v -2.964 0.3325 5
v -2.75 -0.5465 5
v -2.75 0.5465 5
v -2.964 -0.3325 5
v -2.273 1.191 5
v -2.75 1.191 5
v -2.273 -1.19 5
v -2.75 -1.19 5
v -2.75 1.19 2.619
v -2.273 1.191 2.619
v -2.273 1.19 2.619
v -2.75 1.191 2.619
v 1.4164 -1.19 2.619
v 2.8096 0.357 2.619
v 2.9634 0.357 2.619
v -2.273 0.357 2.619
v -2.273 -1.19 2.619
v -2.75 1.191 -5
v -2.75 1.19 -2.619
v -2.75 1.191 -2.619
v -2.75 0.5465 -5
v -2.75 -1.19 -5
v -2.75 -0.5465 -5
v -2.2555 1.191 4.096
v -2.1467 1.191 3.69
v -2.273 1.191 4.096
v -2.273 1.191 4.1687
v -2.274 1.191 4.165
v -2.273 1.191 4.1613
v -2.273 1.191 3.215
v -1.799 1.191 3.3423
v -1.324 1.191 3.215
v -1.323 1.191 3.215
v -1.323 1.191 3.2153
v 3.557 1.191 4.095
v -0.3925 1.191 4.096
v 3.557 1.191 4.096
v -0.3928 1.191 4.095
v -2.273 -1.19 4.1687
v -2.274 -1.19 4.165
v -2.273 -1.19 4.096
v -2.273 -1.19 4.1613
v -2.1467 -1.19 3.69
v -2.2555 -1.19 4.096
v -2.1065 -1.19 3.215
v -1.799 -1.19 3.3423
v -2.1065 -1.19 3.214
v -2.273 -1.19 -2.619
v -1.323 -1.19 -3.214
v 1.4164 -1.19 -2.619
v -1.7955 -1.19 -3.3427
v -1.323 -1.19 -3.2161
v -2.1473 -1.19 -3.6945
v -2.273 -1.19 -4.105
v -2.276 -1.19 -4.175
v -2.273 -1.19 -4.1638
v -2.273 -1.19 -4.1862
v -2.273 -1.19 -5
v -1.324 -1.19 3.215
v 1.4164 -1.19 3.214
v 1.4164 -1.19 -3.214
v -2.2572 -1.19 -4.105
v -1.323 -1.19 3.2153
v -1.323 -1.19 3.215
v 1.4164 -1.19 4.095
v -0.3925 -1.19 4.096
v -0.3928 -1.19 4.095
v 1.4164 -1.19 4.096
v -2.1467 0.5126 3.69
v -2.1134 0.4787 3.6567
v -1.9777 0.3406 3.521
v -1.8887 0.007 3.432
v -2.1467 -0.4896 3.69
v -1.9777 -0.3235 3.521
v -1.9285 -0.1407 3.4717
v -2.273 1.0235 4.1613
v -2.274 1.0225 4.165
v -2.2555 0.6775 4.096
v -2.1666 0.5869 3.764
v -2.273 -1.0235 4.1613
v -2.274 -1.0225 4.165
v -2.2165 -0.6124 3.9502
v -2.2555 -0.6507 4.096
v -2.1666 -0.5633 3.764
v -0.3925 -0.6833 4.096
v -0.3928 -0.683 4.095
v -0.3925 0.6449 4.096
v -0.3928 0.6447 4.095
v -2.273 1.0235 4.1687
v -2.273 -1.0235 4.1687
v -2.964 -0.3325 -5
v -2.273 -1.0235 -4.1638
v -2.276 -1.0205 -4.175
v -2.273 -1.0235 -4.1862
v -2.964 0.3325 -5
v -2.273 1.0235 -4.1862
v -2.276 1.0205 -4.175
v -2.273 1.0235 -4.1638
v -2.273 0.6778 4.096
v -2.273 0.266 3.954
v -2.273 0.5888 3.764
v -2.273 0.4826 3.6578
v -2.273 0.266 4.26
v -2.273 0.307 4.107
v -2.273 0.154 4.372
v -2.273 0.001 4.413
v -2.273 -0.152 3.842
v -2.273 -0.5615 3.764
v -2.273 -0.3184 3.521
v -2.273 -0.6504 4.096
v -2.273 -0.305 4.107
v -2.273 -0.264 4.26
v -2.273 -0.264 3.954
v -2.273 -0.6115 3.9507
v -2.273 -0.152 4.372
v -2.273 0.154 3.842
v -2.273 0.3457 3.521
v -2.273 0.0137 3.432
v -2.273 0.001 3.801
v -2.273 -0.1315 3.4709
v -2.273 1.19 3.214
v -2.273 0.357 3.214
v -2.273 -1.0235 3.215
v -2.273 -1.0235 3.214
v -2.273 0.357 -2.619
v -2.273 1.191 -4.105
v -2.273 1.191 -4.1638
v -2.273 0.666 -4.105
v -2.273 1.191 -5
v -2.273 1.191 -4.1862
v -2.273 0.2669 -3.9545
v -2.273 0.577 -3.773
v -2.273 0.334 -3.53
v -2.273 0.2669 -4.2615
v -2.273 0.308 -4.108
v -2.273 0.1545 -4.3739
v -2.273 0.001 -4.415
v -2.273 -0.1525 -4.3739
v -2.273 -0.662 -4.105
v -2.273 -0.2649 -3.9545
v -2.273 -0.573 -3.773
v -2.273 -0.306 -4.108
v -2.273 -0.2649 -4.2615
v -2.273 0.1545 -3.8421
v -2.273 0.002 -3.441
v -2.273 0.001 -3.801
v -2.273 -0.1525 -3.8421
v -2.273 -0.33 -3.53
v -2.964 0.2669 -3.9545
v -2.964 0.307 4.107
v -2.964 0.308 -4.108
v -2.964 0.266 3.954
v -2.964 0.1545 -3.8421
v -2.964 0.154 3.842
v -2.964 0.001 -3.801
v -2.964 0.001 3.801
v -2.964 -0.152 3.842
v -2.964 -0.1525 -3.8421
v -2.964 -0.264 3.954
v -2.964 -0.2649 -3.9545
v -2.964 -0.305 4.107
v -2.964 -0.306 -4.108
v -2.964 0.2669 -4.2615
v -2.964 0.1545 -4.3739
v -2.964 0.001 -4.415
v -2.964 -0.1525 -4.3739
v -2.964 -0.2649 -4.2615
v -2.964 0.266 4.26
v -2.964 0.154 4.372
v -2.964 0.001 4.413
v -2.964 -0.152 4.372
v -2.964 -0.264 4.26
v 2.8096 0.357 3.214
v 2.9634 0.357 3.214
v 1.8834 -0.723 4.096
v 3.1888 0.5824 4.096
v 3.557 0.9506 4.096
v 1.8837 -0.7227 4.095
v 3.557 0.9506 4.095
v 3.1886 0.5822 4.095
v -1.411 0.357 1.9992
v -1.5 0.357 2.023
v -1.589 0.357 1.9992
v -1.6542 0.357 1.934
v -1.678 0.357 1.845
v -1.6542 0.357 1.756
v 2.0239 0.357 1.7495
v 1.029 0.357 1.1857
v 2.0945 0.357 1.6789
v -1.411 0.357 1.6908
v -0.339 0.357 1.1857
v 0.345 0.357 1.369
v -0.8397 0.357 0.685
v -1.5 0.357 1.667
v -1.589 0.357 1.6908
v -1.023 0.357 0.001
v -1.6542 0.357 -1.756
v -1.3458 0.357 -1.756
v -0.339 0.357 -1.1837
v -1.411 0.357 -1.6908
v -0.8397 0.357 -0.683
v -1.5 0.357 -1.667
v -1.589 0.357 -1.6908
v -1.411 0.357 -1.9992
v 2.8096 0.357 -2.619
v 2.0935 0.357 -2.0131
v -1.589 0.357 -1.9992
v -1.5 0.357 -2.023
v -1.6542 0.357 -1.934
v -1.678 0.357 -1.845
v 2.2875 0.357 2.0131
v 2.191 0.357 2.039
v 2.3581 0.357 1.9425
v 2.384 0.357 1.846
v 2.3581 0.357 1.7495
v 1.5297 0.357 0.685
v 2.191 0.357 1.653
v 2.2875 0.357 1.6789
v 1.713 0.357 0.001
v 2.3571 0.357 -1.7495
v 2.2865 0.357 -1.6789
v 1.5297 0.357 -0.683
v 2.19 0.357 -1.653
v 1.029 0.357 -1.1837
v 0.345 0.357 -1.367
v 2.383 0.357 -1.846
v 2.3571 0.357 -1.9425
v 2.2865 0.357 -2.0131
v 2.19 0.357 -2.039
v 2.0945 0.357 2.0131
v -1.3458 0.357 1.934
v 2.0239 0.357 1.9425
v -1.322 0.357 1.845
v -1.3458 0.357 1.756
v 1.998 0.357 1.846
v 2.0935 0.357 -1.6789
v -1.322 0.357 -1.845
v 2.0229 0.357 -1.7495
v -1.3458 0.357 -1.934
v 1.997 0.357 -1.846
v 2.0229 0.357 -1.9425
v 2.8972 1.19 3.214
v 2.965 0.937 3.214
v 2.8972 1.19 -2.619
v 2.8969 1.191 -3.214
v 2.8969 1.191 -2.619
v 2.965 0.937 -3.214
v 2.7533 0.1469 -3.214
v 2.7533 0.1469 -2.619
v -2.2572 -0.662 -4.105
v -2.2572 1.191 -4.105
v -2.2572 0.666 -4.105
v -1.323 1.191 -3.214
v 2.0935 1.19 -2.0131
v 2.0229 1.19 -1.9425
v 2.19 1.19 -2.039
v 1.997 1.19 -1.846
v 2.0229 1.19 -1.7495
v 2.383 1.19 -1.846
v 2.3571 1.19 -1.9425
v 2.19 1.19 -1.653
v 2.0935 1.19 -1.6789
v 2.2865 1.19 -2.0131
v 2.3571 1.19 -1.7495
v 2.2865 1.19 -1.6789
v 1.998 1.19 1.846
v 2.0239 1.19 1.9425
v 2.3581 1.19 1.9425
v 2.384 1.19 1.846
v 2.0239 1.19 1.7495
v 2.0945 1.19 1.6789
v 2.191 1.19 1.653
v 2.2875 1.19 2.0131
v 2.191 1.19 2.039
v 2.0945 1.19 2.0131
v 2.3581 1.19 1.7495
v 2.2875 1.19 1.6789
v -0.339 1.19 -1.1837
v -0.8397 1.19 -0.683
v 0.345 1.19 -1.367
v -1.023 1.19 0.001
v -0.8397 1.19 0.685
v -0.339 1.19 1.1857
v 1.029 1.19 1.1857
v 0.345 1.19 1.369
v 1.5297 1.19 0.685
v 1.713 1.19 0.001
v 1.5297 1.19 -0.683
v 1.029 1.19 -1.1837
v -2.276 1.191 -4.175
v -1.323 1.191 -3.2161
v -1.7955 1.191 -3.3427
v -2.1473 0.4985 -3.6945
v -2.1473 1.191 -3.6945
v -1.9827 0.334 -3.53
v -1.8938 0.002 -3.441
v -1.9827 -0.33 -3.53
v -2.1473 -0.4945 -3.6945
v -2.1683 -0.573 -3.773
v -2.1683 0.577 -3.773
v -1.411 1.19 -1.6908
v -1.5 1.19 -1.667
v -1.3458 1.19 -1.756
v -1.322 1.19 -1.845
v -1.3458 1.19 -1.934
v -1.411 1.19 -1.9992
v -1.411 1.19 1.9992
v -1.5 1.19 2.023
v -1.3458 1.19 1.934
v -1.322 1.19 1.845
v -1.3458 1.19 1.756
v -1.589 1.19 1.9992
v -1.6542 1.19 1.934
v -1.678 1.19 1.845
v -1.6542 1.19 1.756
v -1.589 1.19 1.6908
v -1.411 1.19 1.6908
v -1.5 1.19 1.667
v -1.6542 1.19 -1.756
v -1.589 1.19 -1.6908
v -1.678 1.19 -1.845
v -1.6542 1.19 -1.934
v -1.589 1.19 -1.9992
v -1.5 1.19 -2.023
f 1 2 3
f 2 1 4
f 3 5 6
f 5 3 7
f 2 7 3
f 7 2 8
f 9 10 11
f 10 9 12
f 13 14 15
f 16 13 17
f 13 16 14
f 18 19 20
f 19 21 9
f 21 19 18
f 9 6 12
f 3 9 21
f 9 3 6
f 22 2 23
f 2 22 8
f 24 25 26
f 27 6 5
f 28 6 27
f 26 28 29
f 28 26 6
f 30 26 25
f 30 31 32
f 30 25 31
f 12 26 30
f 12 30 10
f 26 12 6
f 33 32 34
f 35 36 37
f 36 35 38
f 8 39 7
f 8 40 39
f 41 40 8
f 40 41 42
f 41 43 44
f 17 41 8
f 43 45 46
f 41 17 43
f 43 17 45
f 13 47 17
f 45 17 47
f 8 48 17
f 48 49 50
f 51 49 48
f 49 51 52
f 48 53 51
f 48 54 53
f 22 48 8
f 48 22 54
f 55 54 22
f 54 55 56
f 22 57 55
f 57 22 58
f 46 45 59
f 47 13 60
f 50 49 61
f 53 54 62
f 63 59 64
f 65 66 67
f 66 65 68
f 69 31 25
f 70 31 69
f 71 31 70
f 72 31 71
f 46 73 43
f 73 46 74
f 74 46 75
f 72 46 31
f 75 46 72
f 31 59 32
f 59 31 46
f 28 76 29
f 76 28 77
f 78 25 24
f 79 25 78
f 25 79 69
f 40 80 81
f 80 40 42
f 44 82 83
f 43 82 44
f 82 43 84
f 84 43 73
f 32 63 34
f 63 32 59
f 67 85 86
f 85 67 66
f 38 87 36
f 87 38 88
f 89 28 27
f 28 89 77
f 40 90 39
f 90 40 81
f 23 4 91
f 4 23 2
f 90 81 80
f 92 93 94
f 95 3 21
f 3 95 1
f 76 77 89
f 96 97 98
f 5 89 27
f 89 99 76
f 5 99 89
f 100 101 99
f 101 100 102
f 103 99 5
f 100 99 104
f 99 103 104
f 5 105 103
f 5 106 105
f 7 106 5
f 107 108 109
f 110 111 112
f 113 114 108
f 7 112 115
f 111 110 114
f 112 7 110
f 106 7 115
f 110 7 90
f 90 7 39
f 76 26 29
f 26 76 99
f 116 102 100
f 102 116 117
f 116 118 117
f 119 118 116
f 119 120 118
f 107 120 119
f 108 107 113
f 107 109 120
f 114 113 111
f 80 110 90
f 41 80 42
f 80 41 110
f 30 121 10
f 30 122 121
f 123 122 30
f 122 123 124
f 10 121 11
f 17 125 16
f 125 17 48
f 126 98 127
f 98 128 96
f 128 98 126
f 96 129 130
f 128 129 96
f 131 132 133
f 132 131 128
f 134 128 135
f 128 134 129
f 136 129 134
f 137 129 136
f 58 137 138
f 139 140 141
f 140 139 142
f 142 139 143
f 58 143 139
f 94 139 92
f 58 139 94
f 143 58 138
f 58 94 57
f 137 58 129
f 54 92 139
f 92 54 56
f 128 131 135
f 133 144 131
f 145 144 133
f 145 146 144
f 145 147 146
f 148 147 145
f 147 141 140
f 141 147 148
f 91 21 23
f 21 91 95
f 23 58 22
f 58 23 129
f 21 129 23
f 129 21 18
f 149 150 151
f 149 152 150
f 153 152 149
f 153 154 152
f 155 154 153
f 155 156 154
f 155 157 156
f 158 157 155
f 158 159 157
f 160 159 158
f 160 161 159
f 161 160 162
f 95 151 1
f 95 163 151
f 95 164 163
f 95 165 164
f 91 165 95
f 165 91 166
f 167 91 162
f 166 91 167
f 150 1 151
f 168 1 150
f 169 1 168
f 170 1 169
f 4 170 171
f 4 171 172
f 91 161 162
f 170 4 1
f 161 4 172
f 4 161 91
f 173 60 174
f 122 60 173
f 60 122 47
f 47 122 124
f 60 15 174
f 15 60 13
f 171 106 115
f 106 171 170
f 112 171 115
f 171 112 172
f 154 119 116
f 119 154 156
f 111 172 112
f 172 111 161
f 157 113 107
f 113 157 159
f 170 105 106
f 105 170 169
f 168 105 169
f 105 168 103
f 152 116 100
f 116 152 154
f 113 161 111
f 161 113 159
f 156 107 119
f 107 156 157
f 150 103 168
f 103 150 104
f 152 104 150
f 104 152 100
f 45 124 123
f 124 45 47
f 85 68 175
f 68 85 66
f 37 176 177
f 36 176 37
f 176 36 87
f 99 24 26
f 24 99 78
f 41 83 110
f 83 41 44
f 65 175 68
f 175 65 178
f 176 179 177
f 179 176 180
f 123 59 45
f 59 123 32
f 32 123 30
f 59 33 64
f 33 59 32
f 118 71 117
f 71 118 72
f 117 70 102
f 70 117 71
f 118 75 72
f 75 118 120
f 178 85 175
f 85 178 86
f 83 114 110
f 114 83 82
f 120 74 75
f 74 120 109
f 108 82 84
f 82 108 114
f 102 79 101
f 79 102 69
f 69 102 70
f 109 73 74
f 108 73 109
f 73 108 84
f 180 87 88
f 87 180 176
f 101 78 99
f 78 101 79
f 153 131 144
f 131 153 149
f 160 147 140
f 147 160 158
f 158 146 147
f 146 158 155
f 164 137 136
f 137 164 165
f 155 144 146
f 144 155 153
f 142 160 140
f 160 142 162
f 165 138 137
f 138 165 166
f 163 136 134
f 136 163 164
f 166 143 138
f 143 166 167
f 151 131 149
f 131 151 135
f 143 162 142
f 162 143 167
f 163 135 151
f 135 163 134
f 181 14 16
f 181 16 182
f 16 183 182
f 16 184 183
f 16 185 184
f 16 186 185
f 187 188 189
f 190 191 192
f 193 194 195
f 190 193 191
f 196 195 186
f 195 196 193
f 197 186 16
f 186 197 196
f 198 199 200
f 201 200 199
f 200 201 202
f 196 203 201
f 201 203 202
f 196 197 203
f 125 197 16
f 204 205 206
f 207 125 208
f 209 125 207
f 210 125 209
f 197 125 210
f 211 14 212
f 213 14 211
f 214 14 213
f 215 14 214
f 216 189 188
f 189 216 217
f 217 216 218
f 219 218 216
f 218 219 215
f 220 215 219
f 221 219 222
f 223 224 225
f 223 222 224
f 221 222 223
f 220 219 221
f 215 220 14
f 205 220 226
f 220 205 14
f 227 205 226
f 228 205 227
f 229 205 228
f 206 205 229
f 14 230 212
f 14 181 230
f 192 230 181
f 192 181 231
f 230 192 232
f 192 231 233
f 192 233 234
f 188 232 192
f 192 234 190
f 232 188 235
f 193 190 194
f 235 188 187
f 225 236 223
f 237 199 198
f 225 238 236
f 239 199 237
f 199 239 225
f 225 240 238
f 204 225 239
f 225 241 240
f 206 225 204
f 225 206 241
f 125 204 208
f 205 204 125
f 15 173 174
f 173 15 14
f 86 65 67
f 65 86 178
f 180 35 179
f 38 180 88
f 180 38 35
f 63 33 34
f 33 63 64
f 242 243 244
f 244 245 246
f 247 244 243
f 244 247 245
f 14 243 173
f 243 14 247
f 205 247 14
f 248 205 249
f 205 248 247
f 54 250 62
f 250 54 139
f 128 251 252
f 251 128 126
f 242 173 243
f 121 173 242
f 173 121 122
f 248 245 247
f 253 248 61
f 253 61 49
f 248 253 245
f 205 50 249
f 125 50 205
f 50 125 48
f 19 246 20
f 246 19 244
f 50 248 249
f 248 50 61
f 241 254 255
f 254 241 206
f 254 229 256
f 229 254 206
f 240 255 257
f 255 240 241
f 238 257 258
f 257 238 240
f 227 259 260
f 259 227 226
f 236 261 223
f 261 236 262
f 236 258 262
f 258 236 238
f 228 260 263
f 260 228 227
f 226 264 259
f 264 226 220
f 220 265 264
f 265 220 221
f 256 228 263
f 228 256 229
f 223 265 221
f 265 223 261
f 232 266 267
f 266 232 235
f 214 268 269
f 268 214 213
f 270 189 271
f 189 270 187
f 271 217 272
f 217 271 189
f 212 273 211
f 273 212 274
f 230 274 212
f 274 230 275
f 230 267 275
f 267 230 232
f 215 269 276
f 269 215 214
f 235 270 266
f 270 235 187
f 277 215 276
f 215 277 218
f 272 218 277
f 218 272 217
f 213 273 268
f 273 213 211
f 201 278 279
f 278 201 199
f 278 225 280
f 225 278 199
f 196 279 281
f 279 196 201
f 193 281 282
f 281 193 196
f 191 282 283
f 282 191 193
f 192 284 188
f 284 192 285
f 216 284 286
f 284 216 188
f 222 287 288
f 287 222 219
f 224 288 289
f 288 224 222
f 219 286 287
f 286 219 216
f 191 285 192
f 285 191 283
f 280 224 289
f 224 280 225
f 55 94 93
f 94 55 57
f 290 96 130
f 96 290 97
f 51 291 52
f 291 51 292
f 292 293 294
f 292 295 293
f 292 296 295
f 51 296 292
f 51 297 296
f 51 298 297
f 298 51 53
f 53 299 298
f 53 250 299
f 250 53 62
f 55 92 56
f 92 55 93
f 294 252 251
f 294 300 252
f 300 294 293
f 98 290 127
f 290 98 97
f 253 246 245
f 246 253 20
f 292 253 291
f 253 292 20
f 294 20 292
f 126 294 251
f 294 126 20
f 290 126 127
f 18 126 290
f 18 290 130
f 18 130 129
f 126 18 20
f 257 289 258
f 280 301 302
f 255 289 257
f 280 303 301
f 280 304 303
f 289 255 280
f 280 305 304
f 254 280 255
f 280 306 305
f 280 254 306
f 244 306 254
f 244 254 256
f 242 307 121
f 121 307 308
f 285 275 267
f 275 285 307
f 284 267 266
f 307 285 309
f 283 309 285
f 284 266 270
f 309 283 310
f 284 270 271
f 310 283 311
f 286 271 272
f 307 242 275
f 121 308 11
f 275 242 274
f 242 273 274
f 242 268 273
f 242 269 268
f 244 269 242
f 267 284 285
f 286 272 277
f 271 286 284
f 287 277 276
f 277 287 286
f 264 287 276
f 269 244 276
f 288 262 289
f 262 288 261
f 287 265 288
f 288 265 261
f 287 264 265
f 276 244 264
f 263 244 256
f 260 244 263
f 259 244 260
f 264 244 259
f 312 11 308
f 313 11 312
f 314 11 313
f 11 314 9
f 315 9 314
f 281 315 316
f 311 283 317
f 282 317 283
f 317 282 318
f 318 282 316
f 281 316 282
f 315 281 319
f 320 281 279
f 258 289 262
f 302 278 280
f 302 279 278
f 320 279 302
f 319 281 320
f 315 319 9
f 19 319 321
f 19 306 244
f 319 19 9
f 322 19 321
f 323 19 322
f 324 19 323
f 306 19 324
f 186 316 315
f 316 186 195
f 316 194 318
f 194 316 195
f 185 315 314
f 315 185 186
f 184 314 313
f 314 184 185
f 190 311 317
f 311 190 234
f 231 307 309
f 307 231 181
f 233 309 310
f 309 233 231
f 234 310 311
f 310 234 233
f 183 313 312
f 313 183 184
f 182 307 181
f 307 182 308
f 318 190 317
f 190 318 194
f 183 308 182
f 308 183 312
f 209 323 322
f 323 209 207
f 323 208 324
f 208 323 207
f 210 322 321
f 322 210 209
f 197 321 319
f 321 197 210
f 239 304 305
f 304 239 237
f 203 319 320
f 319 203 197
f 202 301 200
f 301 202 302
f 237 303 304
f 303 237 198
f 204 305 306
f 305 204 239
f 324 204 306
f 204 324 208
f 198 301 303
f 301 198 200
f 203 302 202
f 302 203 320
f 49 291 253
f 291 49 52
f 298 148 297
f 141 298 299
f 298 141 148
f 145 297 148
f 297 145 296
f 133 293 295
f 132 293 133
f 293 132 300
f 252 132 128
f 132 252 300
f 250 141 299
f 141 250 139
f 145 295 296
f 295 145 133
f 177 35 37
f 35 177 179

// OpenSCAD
intersection() {
translate([-3.557, -1.429, -6]) cube(size = [7.114, 2.857, 12], center = false);
union() {
difference() {
difference() {
union() {
difference() {
translate([-2.75, -1.19, 2.619]) cube(size = [20.85, 2.381, 2.381], center = false);
rotate([180, 90, -90])
translate([-4.165, 1.324, -18.1])
cylinder(h = 19.291, r1 = 0.95, r2 = 0.95, center = false, $fn = 12);
}
intersection() {
rotate([-180, 0, 45])
translate([-2.331, -2.331, -5]) cube(size = [20.431, 20.431, 23.1], center = false);
translate([-2.964, -18.1, -5]) cube(size = [0.691, 19.291, 23.1], center = false);
}
}
intersection() {
translate([-2.964, -18.1, -4.105]) cube(size = [21.064, 36.2, 9.105], center = false);
union() {
rotate([-180, 0, 45])
translate([-18.1, 1.843, -3.214]) cube(size = [36.2, 16.257, 5.833], center = false);
rotate([180, 90, -180])
translate([-4.107, 0.001, -18.1])
cylinder(h = 36.2, r1 = 0.306, r2 = 0.306, center = false, $fn = 12);
}
}
}
union() {
rotate([180, 90, -180])
translate([4.108, 0.001, -2.964])
cylinder(h = 21.064, r1 = 0.307, r2 = 0.307, center = false, $fn = 12);
translate([-2.273, 0.357, 2.619]) cube(size = [20.373, 17.743, 0.595], center = false);
difference() {
difference() {
translate([-2.273, -18.1, 3.214]) cube(size = [20.373, 36.2, 14.886], center = false);
rotate([-180, 0, 45])
translate([-18.1, -18.1, -4.096]) cube(size = [15.769, 19.943, 7.31], center = false);
}
difference() {
rotate([-180, 0, 45])
translate([-2.331, -18.1, -4.096]) cube(size = [20.431, 19.943, 0.881], center = false);
rotate([-180, 90, 179])
translate([-4.096, -0.026, -18.1])
cylinder(h = 36.2, r1 = 0.664, r2 = 0.664, center = false, $fn = 12);
}
}
translate([-1.323, -1.19, 3.214]) cube(size = [19.424, 19.291, 0.881], center = false);
}
}
intersection() {
difference() {
difference() {
union() {
translate([-3.202, 0.937, -4.105])
cylinder(h = 7.319, r1 = 6.167, r2 = 6.167, center = false, $fn = 12);
translate([-2.964, -18.1, -5]) cube(size = [0.691, 36.2, 0.895], center = false);
}
union() {
rotate([-180, 0, 45])
translate([-2.331, 1.843, 2.619]) cube(size = [20.431, 16.257, 0.595], center = false);
rotate([180, 90, -90])
translate([1.846, -2.19, 0.357])
cylinder(h = 17.743, r1 = 0.193, r2 = 0.193, center = false, $fn = 12);
}
}
union() {
rotate([180, 90, -90])
translate([-1.846, -2.191, -18.1])
cylinder(h = 36.2, r1 = 0.193, r2 = 0.193, center = false, $fn = 12);
rotate([180, 90, -90])
translate([-0.001, -0.345, -18.1])
cylinder(h = 36.2, r1 = 1.368, r2 = 1.368, center = false, $fn = 12);
rotate([180, 90, -90])
translate([4.175, 1.315, -1.19])
cylinder(h = 19.291, r1 = 0.961, r2 = 0.961, center = false, $fn = 12);
}
}
union() {
difference() {
translate([-2.75, -1.19, -5]) cube(size = [20.85, 2.381, 2.381], center = false);
rotate([-180, 0, 45])
translate([-2.331, -2.331, 3.214]) cube(size = [20.431, 20.431, 1.786], center = false);
}
difference() {
union() {
translate([-2.75, 0.357, -2.619]) cube(size = [20.85, 0.833, 6.715], center = false);
translate([-2.75, -1.19, -2.619]) cube(size = [0.477, 1.548, 5.238], center = false);
}
union() {
rotate([180, 90, -90])
translate([-1.845, 1.5, 0.357])
cylinder(h = 17.743, r1 = 0.178, r2 = 0.178, center = false, $fn = 12);
rotate([180, 90, -90])
translate([1.845, 1.5, -18.1])
cylinder(h = 19.291, r1 = 0.178, r2 = 0.178, center = false, $fn = 12);
}
}
difference() {
translate([-2.273, -1.19, -4.105]) cube(size = [0.95, 2.381, 1.486], center = false);
rotate([0, 90, 0])
translate([4.105, 0.002, -18.1])
cylinder(h = 36.2, r1 = 0.664, r2 = 0.664, center = false, $fn = 12);
}
}
}
}
}
